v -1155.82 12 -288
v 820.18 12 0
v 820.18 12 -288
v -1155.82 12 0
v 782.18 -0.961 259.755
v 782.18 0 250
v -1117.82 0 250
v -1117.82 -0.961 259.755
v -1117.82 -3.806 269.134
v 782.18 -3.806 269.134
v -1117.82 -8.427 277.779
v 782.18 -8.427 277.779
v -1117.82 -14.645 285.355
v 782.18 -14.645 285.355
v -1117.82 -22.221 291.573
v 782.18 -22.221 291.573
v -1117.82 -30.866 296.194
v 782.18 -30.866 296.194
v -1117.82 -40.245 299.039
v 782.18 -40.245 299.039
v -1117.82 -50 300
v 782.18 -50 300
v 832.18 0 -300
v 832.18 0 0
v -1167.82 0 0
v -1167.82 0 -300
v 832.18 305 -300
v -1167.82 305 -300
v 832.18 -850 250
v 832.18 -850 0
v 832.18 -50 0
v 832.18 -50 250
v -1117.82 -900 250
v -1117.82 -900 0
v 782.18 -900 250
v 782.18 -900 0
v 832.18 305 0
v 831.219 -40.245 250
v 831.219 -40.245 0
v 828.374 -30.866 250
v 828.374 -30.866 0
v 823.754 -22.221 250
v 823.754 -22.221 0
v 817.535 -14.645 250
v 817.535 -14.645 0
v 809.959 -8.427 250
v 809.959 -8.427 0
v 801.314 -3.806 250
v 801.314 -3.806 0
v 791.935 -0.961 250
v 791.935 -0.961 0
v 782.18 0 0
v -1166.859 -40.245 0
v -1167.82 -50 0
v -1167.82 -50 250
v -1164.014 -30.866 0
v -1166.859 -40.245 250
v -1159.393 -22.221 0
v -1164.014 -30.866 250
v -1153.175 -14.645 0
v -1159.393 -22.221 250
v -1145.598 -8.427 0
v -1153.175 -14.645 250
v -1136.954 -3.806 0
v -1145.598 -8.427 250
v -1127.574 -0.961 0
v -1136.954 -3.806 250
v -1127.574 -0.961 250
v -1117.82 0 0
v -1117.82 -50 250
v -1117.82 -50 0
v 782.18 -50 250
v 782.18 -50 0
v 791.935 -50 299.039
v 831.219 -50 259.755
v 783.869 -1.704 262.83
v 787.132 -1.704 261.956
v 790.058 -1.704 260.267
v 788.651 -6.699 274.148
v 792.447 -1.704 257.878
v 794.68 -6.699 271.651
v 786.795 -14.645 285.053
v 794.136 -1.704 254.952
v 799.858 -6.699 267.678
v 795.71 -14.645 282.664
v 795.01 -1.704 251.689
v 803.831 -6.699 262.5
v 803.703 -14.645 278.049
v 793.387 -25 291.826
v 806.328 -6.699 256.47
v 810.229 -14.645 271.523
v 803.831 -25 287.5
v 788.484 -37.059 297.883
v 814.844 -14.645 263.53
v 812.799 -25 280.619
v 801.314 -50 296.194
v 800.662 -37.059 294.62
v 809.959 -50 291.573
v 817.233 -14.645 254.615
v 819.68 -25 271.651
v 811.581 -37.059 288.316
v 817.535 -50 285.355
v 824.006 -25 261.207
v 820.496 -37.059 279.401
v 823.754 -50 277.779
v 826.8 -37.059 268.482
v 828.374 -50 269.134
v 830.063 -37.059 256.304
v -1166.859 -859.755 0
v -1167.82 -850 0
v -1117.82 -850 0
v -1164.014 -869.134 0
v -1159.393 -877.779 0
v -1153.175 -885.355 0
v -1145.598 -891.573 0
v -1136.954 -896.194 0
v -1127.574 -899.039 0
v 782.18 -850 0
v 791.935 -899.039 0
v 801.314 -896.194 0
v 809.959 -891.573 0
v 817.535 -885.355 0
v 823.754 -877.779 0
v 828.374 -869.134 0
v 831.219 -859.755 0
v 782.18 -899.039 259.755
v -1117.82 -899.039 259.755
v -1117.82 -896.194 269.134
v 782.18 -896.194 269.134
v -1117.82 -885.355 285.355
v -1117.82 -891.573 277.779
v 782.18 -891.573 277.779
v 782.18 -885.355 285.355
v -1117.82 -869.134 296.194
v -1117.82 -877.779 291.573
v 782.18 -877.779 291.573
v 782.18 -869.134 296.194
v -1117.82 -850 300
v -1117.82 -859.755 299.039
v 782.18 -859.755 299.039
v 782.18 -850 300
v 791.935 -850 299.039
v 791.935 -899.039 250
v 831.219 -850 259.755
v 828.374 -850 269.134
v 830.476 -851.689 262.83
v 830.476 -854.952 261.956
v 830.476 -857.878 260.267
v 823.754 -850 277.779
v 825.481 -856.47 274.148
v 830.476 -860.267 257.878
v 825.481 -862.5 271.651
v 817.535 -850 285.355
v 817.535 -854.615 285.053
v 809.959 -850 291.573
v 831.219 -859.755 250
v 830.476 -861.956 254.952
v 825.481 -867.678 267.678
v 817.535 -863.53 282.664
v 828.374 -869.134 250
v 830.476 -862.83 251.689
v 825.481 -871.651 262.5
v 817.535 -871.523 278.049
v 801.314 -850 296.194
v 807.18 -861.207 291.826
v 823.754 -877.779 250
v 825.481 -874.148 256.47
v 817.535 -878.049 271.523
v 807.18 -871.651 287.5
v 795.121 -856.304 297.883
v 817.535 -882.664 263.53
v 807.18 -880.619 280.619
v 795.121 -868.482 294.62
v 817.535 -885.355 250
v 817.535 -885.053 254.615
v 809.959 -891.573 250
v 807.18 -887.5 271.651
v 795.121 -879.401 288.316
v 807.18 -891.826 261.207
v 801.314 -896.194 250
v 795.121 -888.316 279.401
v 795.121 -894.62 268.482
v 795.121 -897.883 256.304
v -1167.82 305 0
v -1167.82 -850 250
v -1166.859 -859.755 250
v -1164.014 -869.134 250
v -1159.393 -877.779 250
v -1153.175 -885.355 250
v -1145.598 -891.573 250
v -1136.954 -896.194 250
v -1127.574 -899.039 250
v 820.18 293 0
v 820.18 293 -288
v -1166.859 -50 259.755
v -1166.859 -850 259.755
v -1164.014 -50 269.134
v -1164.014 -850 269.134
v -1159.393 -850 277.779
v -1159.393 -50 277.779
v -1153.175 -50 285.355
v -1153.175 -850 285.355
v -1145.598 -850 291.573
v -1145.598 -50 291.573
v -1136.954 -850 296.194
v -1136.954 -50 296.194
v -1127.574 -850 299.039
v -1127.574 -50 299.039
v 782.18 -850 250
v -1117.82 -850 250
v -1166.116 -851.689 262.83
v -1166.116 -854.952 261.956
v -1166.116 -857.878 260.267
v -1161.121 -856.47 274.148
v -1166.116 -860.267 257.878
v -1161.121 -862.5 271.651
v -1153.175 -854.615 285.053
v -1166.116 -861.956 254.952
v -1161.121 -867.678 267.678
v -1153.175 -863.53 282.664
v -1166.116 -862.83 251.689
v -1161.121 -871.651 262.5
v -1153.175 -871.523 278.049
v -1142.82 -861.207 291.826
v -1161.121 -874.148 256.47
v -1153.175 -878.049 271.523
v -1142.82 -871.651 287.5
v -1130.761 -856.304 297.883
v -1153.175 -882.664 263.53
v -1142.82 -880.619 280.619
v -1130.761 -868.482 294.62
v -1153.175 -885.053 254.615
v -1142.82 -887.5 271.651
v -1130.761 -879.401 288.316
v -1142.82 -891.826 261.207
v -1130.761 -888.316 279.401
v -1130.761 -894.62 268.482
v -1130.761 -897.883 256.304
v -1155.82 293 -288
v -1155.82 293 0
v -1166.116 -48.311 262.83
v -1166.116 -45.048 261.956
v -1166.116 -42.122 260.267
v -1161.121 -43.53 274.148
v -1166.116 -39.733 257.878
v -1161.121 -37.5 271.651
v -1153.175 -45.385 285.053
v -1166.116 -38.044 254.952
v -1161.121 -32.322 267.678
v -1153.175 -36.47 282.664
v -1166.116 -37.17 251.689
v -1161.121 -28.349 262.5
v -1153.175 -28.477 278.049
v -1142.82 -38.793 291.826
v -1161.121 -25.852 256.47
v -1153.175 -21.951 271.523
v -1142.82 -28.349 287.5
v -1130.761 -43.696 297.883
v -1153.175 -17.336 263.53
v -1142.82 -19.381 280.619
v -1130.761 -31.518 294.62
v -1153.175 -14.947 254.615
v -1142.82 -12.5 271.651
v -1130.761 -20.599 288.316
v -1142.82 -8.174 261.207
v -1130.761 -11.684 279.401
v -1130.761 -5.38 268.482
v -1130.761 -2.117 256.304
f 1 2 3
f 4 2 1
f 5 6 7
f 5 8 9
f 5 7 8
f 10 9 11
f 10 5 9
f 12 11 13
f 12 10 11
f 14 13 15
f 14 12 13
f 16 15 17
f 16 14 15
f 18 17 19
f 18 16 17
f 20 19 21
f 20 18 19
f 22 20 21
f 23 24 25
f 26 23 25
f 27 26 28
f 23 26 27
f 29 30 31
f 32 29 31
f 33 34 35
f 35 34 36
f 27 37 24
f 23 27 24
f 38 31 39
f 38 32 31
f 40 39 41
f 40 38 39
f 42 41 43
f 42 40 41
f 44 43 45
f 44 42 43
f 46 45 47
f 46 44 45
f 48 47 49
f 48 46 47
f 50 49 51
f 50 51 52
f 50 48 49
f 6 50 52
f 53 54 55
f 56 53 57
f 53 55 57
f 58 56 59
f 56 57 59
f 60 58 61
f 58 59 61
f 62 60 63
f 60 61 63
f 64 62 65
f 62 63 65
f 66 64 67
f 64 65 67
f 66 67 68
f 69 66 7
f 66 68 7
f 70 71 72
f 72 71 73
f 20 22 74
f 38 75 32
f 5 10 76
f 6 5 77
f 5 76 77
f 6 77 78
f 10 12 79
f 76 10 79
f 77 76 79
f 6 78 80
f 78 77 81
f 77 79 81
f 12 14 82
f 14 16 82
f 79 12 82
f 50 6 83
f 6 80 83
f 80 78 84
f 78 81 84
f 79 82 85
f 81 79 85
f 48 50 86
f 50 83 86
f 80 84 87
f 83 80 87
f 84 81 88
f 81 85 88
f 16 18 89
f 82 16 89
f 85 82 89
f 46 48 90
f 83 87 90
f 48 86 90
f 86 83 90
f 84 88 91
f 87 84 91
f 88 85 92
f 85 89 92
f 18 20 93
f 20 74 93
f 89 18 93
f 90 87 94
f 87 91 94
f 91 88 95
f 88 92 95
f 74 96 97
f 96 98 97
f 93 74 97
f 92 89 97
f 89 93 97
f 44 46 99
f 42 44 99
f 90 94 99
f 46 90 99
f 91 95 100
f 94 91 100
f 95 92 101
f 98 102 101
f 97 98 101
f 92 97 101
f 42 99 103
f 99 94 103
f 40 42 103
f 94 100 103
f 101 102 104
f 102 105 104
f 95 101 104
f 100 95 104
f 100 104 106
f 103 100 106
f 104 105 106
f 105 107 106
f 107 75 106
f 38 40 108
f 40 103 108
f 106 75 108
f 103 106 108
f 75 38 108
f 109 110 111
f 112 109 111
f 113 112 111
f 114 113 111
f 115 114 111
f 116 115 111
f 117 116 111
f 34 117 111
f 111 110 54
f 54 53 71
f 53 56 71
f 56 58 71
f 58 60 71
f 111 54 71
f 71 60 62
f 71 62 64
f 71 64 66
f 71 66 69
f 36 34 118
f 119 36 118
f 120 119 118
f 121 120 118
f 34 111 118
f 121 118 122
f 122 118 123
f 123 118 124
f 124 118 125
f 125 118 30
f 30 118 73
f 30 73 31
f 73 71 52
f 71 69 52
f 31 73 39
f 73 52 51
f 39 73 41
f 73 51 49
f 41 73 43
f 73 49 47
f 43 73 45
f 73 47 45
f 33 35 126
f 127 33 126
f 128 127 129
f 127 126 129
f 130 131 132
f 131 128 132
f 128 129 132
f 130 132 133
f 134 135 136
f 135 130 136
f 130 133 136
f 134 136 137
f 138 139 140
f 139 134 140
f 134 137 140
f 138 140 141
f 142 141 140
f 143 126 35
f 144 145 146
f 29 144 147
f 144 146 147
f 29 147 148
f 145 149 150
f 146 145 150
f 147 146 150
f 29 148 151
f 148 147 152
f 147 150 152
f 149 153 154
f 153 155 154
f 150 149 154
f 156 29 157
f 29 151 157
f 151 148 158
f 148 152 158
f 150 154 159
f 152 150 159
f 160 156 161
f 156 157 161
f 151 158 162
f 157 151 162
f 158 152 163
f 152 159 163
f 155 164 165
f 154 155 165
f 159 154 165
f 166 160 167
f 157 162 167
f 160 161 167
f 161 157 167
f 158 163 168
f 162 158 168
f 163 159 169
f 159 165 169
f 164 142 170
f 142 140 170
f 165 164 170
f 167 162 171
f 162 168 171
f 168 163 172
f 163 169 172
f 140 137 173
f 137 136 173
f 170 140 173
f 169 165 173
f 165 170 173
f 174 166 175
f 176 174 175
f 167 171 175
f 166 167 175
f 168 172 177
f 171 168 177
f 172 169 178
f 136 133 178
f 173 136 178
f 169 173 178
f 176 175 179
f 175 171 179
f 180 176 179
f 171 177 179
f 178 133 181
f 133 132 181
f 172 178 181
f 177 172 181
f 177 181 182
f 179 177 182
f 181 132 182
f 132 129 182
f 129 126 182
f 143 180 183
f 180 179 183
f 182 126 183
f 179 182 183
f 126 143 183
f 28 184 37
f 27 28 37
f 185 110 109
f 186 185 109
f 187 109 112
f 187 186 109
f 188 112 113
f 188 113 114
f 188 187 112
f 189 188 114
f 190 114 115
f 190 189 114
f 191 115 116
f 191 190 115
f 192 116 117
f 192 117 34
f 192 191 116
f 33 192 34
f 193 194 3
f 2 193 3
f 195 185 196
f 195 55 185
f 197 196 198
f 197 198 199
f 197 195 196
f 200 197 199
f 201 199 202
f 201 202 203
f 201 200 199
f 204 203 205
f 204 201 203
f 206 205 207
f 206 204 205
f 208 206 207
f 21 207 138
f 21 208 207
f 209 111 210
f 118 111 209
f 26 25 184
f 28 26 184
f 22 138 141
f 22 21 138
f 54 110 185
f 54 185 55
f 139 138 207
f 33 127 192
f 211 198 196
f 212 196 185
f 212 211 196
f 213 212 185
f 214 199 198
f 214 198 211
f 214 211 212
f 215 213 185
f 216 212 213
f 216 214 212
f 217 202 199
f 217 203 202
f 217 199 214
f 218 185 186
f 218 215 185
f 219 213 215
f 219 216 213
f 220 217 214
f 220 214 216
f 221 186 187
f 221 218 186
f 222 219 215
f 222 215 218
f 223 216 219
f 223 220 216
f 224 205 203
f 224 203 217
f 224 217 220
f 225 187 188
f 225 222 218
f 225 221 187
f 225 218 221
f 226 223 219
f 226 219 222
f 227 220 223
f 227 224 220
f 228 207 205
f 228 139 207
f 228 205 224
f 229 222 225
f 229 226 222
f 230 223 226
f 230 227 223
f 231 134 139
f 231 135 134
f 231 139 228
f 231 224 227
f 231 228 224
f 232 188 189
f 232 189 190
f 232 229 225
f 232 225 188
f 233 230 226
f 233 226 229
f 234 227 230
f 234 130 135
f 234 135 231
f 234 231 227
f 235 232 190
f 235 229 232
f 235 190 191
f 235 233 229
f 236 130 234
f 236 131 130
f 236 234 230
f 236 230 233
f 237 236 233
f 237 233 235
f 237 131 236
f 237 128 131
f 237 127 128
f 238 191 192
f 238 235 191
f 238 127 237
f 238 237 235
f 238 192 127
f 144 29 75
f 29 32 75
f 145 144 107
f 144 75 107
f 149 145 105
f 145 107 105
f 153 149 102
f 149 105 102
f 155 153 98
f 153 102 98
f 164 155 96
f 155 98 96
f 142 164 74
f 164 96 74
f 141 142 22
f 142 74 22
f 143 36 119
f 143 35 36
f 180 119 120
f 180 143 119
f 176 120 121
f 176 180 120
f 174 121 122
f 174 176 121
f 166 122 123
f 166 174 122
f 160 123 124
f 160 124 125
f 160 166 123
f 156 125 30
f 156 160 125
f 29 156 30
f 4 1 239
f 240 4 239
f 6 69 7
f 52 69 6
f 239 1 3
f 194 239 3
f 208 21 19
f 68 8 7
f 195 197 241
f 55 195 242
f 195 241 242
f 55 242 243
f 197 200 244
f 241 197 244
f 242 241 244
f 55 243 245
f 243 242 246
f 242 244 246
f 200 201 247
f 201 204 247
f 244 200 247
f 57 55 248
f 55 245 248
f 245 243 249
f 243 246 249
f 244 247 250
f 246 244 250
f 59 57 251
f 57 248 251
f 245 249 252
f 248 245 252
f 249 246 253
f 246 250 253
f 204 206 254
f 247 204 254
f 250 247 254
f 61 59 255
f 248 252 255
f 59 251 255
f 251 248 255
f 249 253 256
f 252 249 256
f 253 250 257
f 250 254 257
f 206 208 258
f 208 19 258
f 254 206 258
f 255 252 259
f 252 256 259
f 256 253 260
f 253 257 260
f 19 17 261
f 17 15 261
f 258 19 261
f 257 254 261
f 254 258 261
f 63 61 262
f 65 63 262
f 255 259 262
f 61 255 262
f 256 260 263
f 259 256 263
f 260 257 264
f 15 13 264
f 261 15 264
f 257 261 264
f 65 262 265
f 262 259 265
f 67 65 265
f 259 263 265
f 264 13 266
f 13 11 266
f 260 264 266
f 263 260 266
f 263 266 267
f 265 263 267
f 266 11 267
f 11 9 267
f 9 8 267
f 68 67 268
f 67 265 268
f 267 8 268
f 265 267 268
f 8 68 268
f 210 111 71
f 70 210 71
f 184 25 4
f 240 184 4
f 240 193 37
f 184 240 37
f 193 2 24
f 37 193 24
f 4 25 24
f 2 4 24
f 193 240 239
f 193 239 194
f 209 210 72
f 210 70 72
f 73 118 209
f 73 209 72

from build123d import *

# Parameters (mm, degrees)
F0_W     = 2000
F0_H     = 900
F1_DEPTH = 300
F2_R     = 50
F3_T     = 50
F5_DEPTH = 300
F6_T     = -12


# Not quite as in the source:
# - a shell that OpenCascade refuses in one call is made with other operations: the cavity is built on its own and cut out


with BuildPart() as f1:
    # F0 (on Top) → F1 (new body)
    with BuildSketch(Plane.XY):
        with Locations((-167.8199538224, -450)):
            Rectangle(F0_W, F0_H)
    extrude(amount=F1_DEPTH)

    # F2
    f2_edges = [f1.edges().sort_by_distance(p)[0] for p in [
        (-167.819954, -900, 300),
        (832.180046, -450, 300),
        (-167.819954, 0, 300),
        (-1167.819954, -450, 300),
        (-1167.819954, -900, 150),
        (832.180046, -900, 150),
        (832.180046, 0, 150),
        (-1167.819954, 0, 150),
    ]]
    fillet(f2_edges, radius=F2_R)

    # F3: shell of thickness 50, made by hand


with BuildPart() as f3_core1:
    # F3_t2: copy of F1
    add(f1.part)

    # the walls: a layer under each face that stays
    f3_faces = [f3_core1.faces().sort_by_distance(p)[0] for p in [
        (-167.8199538224, 0, 125),
        (832.1800461776, -450, 125),
        (-1167.8199538224, -450, 125),
        (-167.8199538224, -900, 125),
        (-167.8199538224, -450, 300),
    ]]
    thicken(f3_faces, amount=-F3_T, mode=Mode.SUBTRACT)


with BuildPart() as f1_1:
    add(f1.part)

    # what is left inside the walls is the cavity
    f3_cavity = [f3_core1.part.solids().sort_by_distance(p)[0] for p in [
        (-167.819954, -583.333333, 0.5),
    ]]
    add(f3_cavity, mode=Mode.SUBTRACT)


with BuildPart() as f5:
    # F4 (on face) → F5 (new body)
    with BuildSketch(Plane(origin=(0, 0, 0), x_dir=(1, 0, 0), z_dir=(0, 0, -1))):
        Polygon((782.1800461776, 0), (-1117.8199538224, 0), (-1167.8199538224, 0), (-1167.8199538224, -305), (832.1800461776, -305), (832.1800461776, 0), align=None)
    extrude(amount=F5_DEPTH)

    # F6
    f6_openings = [f5.faces().sort_by_distance(p)[0] for p in [
        (-167.819954, 152.5, 0),
    ]]
    offset(amount=F6_T, openings=f6_openings)


solid = Compound([f1_1.part, f5.part])
